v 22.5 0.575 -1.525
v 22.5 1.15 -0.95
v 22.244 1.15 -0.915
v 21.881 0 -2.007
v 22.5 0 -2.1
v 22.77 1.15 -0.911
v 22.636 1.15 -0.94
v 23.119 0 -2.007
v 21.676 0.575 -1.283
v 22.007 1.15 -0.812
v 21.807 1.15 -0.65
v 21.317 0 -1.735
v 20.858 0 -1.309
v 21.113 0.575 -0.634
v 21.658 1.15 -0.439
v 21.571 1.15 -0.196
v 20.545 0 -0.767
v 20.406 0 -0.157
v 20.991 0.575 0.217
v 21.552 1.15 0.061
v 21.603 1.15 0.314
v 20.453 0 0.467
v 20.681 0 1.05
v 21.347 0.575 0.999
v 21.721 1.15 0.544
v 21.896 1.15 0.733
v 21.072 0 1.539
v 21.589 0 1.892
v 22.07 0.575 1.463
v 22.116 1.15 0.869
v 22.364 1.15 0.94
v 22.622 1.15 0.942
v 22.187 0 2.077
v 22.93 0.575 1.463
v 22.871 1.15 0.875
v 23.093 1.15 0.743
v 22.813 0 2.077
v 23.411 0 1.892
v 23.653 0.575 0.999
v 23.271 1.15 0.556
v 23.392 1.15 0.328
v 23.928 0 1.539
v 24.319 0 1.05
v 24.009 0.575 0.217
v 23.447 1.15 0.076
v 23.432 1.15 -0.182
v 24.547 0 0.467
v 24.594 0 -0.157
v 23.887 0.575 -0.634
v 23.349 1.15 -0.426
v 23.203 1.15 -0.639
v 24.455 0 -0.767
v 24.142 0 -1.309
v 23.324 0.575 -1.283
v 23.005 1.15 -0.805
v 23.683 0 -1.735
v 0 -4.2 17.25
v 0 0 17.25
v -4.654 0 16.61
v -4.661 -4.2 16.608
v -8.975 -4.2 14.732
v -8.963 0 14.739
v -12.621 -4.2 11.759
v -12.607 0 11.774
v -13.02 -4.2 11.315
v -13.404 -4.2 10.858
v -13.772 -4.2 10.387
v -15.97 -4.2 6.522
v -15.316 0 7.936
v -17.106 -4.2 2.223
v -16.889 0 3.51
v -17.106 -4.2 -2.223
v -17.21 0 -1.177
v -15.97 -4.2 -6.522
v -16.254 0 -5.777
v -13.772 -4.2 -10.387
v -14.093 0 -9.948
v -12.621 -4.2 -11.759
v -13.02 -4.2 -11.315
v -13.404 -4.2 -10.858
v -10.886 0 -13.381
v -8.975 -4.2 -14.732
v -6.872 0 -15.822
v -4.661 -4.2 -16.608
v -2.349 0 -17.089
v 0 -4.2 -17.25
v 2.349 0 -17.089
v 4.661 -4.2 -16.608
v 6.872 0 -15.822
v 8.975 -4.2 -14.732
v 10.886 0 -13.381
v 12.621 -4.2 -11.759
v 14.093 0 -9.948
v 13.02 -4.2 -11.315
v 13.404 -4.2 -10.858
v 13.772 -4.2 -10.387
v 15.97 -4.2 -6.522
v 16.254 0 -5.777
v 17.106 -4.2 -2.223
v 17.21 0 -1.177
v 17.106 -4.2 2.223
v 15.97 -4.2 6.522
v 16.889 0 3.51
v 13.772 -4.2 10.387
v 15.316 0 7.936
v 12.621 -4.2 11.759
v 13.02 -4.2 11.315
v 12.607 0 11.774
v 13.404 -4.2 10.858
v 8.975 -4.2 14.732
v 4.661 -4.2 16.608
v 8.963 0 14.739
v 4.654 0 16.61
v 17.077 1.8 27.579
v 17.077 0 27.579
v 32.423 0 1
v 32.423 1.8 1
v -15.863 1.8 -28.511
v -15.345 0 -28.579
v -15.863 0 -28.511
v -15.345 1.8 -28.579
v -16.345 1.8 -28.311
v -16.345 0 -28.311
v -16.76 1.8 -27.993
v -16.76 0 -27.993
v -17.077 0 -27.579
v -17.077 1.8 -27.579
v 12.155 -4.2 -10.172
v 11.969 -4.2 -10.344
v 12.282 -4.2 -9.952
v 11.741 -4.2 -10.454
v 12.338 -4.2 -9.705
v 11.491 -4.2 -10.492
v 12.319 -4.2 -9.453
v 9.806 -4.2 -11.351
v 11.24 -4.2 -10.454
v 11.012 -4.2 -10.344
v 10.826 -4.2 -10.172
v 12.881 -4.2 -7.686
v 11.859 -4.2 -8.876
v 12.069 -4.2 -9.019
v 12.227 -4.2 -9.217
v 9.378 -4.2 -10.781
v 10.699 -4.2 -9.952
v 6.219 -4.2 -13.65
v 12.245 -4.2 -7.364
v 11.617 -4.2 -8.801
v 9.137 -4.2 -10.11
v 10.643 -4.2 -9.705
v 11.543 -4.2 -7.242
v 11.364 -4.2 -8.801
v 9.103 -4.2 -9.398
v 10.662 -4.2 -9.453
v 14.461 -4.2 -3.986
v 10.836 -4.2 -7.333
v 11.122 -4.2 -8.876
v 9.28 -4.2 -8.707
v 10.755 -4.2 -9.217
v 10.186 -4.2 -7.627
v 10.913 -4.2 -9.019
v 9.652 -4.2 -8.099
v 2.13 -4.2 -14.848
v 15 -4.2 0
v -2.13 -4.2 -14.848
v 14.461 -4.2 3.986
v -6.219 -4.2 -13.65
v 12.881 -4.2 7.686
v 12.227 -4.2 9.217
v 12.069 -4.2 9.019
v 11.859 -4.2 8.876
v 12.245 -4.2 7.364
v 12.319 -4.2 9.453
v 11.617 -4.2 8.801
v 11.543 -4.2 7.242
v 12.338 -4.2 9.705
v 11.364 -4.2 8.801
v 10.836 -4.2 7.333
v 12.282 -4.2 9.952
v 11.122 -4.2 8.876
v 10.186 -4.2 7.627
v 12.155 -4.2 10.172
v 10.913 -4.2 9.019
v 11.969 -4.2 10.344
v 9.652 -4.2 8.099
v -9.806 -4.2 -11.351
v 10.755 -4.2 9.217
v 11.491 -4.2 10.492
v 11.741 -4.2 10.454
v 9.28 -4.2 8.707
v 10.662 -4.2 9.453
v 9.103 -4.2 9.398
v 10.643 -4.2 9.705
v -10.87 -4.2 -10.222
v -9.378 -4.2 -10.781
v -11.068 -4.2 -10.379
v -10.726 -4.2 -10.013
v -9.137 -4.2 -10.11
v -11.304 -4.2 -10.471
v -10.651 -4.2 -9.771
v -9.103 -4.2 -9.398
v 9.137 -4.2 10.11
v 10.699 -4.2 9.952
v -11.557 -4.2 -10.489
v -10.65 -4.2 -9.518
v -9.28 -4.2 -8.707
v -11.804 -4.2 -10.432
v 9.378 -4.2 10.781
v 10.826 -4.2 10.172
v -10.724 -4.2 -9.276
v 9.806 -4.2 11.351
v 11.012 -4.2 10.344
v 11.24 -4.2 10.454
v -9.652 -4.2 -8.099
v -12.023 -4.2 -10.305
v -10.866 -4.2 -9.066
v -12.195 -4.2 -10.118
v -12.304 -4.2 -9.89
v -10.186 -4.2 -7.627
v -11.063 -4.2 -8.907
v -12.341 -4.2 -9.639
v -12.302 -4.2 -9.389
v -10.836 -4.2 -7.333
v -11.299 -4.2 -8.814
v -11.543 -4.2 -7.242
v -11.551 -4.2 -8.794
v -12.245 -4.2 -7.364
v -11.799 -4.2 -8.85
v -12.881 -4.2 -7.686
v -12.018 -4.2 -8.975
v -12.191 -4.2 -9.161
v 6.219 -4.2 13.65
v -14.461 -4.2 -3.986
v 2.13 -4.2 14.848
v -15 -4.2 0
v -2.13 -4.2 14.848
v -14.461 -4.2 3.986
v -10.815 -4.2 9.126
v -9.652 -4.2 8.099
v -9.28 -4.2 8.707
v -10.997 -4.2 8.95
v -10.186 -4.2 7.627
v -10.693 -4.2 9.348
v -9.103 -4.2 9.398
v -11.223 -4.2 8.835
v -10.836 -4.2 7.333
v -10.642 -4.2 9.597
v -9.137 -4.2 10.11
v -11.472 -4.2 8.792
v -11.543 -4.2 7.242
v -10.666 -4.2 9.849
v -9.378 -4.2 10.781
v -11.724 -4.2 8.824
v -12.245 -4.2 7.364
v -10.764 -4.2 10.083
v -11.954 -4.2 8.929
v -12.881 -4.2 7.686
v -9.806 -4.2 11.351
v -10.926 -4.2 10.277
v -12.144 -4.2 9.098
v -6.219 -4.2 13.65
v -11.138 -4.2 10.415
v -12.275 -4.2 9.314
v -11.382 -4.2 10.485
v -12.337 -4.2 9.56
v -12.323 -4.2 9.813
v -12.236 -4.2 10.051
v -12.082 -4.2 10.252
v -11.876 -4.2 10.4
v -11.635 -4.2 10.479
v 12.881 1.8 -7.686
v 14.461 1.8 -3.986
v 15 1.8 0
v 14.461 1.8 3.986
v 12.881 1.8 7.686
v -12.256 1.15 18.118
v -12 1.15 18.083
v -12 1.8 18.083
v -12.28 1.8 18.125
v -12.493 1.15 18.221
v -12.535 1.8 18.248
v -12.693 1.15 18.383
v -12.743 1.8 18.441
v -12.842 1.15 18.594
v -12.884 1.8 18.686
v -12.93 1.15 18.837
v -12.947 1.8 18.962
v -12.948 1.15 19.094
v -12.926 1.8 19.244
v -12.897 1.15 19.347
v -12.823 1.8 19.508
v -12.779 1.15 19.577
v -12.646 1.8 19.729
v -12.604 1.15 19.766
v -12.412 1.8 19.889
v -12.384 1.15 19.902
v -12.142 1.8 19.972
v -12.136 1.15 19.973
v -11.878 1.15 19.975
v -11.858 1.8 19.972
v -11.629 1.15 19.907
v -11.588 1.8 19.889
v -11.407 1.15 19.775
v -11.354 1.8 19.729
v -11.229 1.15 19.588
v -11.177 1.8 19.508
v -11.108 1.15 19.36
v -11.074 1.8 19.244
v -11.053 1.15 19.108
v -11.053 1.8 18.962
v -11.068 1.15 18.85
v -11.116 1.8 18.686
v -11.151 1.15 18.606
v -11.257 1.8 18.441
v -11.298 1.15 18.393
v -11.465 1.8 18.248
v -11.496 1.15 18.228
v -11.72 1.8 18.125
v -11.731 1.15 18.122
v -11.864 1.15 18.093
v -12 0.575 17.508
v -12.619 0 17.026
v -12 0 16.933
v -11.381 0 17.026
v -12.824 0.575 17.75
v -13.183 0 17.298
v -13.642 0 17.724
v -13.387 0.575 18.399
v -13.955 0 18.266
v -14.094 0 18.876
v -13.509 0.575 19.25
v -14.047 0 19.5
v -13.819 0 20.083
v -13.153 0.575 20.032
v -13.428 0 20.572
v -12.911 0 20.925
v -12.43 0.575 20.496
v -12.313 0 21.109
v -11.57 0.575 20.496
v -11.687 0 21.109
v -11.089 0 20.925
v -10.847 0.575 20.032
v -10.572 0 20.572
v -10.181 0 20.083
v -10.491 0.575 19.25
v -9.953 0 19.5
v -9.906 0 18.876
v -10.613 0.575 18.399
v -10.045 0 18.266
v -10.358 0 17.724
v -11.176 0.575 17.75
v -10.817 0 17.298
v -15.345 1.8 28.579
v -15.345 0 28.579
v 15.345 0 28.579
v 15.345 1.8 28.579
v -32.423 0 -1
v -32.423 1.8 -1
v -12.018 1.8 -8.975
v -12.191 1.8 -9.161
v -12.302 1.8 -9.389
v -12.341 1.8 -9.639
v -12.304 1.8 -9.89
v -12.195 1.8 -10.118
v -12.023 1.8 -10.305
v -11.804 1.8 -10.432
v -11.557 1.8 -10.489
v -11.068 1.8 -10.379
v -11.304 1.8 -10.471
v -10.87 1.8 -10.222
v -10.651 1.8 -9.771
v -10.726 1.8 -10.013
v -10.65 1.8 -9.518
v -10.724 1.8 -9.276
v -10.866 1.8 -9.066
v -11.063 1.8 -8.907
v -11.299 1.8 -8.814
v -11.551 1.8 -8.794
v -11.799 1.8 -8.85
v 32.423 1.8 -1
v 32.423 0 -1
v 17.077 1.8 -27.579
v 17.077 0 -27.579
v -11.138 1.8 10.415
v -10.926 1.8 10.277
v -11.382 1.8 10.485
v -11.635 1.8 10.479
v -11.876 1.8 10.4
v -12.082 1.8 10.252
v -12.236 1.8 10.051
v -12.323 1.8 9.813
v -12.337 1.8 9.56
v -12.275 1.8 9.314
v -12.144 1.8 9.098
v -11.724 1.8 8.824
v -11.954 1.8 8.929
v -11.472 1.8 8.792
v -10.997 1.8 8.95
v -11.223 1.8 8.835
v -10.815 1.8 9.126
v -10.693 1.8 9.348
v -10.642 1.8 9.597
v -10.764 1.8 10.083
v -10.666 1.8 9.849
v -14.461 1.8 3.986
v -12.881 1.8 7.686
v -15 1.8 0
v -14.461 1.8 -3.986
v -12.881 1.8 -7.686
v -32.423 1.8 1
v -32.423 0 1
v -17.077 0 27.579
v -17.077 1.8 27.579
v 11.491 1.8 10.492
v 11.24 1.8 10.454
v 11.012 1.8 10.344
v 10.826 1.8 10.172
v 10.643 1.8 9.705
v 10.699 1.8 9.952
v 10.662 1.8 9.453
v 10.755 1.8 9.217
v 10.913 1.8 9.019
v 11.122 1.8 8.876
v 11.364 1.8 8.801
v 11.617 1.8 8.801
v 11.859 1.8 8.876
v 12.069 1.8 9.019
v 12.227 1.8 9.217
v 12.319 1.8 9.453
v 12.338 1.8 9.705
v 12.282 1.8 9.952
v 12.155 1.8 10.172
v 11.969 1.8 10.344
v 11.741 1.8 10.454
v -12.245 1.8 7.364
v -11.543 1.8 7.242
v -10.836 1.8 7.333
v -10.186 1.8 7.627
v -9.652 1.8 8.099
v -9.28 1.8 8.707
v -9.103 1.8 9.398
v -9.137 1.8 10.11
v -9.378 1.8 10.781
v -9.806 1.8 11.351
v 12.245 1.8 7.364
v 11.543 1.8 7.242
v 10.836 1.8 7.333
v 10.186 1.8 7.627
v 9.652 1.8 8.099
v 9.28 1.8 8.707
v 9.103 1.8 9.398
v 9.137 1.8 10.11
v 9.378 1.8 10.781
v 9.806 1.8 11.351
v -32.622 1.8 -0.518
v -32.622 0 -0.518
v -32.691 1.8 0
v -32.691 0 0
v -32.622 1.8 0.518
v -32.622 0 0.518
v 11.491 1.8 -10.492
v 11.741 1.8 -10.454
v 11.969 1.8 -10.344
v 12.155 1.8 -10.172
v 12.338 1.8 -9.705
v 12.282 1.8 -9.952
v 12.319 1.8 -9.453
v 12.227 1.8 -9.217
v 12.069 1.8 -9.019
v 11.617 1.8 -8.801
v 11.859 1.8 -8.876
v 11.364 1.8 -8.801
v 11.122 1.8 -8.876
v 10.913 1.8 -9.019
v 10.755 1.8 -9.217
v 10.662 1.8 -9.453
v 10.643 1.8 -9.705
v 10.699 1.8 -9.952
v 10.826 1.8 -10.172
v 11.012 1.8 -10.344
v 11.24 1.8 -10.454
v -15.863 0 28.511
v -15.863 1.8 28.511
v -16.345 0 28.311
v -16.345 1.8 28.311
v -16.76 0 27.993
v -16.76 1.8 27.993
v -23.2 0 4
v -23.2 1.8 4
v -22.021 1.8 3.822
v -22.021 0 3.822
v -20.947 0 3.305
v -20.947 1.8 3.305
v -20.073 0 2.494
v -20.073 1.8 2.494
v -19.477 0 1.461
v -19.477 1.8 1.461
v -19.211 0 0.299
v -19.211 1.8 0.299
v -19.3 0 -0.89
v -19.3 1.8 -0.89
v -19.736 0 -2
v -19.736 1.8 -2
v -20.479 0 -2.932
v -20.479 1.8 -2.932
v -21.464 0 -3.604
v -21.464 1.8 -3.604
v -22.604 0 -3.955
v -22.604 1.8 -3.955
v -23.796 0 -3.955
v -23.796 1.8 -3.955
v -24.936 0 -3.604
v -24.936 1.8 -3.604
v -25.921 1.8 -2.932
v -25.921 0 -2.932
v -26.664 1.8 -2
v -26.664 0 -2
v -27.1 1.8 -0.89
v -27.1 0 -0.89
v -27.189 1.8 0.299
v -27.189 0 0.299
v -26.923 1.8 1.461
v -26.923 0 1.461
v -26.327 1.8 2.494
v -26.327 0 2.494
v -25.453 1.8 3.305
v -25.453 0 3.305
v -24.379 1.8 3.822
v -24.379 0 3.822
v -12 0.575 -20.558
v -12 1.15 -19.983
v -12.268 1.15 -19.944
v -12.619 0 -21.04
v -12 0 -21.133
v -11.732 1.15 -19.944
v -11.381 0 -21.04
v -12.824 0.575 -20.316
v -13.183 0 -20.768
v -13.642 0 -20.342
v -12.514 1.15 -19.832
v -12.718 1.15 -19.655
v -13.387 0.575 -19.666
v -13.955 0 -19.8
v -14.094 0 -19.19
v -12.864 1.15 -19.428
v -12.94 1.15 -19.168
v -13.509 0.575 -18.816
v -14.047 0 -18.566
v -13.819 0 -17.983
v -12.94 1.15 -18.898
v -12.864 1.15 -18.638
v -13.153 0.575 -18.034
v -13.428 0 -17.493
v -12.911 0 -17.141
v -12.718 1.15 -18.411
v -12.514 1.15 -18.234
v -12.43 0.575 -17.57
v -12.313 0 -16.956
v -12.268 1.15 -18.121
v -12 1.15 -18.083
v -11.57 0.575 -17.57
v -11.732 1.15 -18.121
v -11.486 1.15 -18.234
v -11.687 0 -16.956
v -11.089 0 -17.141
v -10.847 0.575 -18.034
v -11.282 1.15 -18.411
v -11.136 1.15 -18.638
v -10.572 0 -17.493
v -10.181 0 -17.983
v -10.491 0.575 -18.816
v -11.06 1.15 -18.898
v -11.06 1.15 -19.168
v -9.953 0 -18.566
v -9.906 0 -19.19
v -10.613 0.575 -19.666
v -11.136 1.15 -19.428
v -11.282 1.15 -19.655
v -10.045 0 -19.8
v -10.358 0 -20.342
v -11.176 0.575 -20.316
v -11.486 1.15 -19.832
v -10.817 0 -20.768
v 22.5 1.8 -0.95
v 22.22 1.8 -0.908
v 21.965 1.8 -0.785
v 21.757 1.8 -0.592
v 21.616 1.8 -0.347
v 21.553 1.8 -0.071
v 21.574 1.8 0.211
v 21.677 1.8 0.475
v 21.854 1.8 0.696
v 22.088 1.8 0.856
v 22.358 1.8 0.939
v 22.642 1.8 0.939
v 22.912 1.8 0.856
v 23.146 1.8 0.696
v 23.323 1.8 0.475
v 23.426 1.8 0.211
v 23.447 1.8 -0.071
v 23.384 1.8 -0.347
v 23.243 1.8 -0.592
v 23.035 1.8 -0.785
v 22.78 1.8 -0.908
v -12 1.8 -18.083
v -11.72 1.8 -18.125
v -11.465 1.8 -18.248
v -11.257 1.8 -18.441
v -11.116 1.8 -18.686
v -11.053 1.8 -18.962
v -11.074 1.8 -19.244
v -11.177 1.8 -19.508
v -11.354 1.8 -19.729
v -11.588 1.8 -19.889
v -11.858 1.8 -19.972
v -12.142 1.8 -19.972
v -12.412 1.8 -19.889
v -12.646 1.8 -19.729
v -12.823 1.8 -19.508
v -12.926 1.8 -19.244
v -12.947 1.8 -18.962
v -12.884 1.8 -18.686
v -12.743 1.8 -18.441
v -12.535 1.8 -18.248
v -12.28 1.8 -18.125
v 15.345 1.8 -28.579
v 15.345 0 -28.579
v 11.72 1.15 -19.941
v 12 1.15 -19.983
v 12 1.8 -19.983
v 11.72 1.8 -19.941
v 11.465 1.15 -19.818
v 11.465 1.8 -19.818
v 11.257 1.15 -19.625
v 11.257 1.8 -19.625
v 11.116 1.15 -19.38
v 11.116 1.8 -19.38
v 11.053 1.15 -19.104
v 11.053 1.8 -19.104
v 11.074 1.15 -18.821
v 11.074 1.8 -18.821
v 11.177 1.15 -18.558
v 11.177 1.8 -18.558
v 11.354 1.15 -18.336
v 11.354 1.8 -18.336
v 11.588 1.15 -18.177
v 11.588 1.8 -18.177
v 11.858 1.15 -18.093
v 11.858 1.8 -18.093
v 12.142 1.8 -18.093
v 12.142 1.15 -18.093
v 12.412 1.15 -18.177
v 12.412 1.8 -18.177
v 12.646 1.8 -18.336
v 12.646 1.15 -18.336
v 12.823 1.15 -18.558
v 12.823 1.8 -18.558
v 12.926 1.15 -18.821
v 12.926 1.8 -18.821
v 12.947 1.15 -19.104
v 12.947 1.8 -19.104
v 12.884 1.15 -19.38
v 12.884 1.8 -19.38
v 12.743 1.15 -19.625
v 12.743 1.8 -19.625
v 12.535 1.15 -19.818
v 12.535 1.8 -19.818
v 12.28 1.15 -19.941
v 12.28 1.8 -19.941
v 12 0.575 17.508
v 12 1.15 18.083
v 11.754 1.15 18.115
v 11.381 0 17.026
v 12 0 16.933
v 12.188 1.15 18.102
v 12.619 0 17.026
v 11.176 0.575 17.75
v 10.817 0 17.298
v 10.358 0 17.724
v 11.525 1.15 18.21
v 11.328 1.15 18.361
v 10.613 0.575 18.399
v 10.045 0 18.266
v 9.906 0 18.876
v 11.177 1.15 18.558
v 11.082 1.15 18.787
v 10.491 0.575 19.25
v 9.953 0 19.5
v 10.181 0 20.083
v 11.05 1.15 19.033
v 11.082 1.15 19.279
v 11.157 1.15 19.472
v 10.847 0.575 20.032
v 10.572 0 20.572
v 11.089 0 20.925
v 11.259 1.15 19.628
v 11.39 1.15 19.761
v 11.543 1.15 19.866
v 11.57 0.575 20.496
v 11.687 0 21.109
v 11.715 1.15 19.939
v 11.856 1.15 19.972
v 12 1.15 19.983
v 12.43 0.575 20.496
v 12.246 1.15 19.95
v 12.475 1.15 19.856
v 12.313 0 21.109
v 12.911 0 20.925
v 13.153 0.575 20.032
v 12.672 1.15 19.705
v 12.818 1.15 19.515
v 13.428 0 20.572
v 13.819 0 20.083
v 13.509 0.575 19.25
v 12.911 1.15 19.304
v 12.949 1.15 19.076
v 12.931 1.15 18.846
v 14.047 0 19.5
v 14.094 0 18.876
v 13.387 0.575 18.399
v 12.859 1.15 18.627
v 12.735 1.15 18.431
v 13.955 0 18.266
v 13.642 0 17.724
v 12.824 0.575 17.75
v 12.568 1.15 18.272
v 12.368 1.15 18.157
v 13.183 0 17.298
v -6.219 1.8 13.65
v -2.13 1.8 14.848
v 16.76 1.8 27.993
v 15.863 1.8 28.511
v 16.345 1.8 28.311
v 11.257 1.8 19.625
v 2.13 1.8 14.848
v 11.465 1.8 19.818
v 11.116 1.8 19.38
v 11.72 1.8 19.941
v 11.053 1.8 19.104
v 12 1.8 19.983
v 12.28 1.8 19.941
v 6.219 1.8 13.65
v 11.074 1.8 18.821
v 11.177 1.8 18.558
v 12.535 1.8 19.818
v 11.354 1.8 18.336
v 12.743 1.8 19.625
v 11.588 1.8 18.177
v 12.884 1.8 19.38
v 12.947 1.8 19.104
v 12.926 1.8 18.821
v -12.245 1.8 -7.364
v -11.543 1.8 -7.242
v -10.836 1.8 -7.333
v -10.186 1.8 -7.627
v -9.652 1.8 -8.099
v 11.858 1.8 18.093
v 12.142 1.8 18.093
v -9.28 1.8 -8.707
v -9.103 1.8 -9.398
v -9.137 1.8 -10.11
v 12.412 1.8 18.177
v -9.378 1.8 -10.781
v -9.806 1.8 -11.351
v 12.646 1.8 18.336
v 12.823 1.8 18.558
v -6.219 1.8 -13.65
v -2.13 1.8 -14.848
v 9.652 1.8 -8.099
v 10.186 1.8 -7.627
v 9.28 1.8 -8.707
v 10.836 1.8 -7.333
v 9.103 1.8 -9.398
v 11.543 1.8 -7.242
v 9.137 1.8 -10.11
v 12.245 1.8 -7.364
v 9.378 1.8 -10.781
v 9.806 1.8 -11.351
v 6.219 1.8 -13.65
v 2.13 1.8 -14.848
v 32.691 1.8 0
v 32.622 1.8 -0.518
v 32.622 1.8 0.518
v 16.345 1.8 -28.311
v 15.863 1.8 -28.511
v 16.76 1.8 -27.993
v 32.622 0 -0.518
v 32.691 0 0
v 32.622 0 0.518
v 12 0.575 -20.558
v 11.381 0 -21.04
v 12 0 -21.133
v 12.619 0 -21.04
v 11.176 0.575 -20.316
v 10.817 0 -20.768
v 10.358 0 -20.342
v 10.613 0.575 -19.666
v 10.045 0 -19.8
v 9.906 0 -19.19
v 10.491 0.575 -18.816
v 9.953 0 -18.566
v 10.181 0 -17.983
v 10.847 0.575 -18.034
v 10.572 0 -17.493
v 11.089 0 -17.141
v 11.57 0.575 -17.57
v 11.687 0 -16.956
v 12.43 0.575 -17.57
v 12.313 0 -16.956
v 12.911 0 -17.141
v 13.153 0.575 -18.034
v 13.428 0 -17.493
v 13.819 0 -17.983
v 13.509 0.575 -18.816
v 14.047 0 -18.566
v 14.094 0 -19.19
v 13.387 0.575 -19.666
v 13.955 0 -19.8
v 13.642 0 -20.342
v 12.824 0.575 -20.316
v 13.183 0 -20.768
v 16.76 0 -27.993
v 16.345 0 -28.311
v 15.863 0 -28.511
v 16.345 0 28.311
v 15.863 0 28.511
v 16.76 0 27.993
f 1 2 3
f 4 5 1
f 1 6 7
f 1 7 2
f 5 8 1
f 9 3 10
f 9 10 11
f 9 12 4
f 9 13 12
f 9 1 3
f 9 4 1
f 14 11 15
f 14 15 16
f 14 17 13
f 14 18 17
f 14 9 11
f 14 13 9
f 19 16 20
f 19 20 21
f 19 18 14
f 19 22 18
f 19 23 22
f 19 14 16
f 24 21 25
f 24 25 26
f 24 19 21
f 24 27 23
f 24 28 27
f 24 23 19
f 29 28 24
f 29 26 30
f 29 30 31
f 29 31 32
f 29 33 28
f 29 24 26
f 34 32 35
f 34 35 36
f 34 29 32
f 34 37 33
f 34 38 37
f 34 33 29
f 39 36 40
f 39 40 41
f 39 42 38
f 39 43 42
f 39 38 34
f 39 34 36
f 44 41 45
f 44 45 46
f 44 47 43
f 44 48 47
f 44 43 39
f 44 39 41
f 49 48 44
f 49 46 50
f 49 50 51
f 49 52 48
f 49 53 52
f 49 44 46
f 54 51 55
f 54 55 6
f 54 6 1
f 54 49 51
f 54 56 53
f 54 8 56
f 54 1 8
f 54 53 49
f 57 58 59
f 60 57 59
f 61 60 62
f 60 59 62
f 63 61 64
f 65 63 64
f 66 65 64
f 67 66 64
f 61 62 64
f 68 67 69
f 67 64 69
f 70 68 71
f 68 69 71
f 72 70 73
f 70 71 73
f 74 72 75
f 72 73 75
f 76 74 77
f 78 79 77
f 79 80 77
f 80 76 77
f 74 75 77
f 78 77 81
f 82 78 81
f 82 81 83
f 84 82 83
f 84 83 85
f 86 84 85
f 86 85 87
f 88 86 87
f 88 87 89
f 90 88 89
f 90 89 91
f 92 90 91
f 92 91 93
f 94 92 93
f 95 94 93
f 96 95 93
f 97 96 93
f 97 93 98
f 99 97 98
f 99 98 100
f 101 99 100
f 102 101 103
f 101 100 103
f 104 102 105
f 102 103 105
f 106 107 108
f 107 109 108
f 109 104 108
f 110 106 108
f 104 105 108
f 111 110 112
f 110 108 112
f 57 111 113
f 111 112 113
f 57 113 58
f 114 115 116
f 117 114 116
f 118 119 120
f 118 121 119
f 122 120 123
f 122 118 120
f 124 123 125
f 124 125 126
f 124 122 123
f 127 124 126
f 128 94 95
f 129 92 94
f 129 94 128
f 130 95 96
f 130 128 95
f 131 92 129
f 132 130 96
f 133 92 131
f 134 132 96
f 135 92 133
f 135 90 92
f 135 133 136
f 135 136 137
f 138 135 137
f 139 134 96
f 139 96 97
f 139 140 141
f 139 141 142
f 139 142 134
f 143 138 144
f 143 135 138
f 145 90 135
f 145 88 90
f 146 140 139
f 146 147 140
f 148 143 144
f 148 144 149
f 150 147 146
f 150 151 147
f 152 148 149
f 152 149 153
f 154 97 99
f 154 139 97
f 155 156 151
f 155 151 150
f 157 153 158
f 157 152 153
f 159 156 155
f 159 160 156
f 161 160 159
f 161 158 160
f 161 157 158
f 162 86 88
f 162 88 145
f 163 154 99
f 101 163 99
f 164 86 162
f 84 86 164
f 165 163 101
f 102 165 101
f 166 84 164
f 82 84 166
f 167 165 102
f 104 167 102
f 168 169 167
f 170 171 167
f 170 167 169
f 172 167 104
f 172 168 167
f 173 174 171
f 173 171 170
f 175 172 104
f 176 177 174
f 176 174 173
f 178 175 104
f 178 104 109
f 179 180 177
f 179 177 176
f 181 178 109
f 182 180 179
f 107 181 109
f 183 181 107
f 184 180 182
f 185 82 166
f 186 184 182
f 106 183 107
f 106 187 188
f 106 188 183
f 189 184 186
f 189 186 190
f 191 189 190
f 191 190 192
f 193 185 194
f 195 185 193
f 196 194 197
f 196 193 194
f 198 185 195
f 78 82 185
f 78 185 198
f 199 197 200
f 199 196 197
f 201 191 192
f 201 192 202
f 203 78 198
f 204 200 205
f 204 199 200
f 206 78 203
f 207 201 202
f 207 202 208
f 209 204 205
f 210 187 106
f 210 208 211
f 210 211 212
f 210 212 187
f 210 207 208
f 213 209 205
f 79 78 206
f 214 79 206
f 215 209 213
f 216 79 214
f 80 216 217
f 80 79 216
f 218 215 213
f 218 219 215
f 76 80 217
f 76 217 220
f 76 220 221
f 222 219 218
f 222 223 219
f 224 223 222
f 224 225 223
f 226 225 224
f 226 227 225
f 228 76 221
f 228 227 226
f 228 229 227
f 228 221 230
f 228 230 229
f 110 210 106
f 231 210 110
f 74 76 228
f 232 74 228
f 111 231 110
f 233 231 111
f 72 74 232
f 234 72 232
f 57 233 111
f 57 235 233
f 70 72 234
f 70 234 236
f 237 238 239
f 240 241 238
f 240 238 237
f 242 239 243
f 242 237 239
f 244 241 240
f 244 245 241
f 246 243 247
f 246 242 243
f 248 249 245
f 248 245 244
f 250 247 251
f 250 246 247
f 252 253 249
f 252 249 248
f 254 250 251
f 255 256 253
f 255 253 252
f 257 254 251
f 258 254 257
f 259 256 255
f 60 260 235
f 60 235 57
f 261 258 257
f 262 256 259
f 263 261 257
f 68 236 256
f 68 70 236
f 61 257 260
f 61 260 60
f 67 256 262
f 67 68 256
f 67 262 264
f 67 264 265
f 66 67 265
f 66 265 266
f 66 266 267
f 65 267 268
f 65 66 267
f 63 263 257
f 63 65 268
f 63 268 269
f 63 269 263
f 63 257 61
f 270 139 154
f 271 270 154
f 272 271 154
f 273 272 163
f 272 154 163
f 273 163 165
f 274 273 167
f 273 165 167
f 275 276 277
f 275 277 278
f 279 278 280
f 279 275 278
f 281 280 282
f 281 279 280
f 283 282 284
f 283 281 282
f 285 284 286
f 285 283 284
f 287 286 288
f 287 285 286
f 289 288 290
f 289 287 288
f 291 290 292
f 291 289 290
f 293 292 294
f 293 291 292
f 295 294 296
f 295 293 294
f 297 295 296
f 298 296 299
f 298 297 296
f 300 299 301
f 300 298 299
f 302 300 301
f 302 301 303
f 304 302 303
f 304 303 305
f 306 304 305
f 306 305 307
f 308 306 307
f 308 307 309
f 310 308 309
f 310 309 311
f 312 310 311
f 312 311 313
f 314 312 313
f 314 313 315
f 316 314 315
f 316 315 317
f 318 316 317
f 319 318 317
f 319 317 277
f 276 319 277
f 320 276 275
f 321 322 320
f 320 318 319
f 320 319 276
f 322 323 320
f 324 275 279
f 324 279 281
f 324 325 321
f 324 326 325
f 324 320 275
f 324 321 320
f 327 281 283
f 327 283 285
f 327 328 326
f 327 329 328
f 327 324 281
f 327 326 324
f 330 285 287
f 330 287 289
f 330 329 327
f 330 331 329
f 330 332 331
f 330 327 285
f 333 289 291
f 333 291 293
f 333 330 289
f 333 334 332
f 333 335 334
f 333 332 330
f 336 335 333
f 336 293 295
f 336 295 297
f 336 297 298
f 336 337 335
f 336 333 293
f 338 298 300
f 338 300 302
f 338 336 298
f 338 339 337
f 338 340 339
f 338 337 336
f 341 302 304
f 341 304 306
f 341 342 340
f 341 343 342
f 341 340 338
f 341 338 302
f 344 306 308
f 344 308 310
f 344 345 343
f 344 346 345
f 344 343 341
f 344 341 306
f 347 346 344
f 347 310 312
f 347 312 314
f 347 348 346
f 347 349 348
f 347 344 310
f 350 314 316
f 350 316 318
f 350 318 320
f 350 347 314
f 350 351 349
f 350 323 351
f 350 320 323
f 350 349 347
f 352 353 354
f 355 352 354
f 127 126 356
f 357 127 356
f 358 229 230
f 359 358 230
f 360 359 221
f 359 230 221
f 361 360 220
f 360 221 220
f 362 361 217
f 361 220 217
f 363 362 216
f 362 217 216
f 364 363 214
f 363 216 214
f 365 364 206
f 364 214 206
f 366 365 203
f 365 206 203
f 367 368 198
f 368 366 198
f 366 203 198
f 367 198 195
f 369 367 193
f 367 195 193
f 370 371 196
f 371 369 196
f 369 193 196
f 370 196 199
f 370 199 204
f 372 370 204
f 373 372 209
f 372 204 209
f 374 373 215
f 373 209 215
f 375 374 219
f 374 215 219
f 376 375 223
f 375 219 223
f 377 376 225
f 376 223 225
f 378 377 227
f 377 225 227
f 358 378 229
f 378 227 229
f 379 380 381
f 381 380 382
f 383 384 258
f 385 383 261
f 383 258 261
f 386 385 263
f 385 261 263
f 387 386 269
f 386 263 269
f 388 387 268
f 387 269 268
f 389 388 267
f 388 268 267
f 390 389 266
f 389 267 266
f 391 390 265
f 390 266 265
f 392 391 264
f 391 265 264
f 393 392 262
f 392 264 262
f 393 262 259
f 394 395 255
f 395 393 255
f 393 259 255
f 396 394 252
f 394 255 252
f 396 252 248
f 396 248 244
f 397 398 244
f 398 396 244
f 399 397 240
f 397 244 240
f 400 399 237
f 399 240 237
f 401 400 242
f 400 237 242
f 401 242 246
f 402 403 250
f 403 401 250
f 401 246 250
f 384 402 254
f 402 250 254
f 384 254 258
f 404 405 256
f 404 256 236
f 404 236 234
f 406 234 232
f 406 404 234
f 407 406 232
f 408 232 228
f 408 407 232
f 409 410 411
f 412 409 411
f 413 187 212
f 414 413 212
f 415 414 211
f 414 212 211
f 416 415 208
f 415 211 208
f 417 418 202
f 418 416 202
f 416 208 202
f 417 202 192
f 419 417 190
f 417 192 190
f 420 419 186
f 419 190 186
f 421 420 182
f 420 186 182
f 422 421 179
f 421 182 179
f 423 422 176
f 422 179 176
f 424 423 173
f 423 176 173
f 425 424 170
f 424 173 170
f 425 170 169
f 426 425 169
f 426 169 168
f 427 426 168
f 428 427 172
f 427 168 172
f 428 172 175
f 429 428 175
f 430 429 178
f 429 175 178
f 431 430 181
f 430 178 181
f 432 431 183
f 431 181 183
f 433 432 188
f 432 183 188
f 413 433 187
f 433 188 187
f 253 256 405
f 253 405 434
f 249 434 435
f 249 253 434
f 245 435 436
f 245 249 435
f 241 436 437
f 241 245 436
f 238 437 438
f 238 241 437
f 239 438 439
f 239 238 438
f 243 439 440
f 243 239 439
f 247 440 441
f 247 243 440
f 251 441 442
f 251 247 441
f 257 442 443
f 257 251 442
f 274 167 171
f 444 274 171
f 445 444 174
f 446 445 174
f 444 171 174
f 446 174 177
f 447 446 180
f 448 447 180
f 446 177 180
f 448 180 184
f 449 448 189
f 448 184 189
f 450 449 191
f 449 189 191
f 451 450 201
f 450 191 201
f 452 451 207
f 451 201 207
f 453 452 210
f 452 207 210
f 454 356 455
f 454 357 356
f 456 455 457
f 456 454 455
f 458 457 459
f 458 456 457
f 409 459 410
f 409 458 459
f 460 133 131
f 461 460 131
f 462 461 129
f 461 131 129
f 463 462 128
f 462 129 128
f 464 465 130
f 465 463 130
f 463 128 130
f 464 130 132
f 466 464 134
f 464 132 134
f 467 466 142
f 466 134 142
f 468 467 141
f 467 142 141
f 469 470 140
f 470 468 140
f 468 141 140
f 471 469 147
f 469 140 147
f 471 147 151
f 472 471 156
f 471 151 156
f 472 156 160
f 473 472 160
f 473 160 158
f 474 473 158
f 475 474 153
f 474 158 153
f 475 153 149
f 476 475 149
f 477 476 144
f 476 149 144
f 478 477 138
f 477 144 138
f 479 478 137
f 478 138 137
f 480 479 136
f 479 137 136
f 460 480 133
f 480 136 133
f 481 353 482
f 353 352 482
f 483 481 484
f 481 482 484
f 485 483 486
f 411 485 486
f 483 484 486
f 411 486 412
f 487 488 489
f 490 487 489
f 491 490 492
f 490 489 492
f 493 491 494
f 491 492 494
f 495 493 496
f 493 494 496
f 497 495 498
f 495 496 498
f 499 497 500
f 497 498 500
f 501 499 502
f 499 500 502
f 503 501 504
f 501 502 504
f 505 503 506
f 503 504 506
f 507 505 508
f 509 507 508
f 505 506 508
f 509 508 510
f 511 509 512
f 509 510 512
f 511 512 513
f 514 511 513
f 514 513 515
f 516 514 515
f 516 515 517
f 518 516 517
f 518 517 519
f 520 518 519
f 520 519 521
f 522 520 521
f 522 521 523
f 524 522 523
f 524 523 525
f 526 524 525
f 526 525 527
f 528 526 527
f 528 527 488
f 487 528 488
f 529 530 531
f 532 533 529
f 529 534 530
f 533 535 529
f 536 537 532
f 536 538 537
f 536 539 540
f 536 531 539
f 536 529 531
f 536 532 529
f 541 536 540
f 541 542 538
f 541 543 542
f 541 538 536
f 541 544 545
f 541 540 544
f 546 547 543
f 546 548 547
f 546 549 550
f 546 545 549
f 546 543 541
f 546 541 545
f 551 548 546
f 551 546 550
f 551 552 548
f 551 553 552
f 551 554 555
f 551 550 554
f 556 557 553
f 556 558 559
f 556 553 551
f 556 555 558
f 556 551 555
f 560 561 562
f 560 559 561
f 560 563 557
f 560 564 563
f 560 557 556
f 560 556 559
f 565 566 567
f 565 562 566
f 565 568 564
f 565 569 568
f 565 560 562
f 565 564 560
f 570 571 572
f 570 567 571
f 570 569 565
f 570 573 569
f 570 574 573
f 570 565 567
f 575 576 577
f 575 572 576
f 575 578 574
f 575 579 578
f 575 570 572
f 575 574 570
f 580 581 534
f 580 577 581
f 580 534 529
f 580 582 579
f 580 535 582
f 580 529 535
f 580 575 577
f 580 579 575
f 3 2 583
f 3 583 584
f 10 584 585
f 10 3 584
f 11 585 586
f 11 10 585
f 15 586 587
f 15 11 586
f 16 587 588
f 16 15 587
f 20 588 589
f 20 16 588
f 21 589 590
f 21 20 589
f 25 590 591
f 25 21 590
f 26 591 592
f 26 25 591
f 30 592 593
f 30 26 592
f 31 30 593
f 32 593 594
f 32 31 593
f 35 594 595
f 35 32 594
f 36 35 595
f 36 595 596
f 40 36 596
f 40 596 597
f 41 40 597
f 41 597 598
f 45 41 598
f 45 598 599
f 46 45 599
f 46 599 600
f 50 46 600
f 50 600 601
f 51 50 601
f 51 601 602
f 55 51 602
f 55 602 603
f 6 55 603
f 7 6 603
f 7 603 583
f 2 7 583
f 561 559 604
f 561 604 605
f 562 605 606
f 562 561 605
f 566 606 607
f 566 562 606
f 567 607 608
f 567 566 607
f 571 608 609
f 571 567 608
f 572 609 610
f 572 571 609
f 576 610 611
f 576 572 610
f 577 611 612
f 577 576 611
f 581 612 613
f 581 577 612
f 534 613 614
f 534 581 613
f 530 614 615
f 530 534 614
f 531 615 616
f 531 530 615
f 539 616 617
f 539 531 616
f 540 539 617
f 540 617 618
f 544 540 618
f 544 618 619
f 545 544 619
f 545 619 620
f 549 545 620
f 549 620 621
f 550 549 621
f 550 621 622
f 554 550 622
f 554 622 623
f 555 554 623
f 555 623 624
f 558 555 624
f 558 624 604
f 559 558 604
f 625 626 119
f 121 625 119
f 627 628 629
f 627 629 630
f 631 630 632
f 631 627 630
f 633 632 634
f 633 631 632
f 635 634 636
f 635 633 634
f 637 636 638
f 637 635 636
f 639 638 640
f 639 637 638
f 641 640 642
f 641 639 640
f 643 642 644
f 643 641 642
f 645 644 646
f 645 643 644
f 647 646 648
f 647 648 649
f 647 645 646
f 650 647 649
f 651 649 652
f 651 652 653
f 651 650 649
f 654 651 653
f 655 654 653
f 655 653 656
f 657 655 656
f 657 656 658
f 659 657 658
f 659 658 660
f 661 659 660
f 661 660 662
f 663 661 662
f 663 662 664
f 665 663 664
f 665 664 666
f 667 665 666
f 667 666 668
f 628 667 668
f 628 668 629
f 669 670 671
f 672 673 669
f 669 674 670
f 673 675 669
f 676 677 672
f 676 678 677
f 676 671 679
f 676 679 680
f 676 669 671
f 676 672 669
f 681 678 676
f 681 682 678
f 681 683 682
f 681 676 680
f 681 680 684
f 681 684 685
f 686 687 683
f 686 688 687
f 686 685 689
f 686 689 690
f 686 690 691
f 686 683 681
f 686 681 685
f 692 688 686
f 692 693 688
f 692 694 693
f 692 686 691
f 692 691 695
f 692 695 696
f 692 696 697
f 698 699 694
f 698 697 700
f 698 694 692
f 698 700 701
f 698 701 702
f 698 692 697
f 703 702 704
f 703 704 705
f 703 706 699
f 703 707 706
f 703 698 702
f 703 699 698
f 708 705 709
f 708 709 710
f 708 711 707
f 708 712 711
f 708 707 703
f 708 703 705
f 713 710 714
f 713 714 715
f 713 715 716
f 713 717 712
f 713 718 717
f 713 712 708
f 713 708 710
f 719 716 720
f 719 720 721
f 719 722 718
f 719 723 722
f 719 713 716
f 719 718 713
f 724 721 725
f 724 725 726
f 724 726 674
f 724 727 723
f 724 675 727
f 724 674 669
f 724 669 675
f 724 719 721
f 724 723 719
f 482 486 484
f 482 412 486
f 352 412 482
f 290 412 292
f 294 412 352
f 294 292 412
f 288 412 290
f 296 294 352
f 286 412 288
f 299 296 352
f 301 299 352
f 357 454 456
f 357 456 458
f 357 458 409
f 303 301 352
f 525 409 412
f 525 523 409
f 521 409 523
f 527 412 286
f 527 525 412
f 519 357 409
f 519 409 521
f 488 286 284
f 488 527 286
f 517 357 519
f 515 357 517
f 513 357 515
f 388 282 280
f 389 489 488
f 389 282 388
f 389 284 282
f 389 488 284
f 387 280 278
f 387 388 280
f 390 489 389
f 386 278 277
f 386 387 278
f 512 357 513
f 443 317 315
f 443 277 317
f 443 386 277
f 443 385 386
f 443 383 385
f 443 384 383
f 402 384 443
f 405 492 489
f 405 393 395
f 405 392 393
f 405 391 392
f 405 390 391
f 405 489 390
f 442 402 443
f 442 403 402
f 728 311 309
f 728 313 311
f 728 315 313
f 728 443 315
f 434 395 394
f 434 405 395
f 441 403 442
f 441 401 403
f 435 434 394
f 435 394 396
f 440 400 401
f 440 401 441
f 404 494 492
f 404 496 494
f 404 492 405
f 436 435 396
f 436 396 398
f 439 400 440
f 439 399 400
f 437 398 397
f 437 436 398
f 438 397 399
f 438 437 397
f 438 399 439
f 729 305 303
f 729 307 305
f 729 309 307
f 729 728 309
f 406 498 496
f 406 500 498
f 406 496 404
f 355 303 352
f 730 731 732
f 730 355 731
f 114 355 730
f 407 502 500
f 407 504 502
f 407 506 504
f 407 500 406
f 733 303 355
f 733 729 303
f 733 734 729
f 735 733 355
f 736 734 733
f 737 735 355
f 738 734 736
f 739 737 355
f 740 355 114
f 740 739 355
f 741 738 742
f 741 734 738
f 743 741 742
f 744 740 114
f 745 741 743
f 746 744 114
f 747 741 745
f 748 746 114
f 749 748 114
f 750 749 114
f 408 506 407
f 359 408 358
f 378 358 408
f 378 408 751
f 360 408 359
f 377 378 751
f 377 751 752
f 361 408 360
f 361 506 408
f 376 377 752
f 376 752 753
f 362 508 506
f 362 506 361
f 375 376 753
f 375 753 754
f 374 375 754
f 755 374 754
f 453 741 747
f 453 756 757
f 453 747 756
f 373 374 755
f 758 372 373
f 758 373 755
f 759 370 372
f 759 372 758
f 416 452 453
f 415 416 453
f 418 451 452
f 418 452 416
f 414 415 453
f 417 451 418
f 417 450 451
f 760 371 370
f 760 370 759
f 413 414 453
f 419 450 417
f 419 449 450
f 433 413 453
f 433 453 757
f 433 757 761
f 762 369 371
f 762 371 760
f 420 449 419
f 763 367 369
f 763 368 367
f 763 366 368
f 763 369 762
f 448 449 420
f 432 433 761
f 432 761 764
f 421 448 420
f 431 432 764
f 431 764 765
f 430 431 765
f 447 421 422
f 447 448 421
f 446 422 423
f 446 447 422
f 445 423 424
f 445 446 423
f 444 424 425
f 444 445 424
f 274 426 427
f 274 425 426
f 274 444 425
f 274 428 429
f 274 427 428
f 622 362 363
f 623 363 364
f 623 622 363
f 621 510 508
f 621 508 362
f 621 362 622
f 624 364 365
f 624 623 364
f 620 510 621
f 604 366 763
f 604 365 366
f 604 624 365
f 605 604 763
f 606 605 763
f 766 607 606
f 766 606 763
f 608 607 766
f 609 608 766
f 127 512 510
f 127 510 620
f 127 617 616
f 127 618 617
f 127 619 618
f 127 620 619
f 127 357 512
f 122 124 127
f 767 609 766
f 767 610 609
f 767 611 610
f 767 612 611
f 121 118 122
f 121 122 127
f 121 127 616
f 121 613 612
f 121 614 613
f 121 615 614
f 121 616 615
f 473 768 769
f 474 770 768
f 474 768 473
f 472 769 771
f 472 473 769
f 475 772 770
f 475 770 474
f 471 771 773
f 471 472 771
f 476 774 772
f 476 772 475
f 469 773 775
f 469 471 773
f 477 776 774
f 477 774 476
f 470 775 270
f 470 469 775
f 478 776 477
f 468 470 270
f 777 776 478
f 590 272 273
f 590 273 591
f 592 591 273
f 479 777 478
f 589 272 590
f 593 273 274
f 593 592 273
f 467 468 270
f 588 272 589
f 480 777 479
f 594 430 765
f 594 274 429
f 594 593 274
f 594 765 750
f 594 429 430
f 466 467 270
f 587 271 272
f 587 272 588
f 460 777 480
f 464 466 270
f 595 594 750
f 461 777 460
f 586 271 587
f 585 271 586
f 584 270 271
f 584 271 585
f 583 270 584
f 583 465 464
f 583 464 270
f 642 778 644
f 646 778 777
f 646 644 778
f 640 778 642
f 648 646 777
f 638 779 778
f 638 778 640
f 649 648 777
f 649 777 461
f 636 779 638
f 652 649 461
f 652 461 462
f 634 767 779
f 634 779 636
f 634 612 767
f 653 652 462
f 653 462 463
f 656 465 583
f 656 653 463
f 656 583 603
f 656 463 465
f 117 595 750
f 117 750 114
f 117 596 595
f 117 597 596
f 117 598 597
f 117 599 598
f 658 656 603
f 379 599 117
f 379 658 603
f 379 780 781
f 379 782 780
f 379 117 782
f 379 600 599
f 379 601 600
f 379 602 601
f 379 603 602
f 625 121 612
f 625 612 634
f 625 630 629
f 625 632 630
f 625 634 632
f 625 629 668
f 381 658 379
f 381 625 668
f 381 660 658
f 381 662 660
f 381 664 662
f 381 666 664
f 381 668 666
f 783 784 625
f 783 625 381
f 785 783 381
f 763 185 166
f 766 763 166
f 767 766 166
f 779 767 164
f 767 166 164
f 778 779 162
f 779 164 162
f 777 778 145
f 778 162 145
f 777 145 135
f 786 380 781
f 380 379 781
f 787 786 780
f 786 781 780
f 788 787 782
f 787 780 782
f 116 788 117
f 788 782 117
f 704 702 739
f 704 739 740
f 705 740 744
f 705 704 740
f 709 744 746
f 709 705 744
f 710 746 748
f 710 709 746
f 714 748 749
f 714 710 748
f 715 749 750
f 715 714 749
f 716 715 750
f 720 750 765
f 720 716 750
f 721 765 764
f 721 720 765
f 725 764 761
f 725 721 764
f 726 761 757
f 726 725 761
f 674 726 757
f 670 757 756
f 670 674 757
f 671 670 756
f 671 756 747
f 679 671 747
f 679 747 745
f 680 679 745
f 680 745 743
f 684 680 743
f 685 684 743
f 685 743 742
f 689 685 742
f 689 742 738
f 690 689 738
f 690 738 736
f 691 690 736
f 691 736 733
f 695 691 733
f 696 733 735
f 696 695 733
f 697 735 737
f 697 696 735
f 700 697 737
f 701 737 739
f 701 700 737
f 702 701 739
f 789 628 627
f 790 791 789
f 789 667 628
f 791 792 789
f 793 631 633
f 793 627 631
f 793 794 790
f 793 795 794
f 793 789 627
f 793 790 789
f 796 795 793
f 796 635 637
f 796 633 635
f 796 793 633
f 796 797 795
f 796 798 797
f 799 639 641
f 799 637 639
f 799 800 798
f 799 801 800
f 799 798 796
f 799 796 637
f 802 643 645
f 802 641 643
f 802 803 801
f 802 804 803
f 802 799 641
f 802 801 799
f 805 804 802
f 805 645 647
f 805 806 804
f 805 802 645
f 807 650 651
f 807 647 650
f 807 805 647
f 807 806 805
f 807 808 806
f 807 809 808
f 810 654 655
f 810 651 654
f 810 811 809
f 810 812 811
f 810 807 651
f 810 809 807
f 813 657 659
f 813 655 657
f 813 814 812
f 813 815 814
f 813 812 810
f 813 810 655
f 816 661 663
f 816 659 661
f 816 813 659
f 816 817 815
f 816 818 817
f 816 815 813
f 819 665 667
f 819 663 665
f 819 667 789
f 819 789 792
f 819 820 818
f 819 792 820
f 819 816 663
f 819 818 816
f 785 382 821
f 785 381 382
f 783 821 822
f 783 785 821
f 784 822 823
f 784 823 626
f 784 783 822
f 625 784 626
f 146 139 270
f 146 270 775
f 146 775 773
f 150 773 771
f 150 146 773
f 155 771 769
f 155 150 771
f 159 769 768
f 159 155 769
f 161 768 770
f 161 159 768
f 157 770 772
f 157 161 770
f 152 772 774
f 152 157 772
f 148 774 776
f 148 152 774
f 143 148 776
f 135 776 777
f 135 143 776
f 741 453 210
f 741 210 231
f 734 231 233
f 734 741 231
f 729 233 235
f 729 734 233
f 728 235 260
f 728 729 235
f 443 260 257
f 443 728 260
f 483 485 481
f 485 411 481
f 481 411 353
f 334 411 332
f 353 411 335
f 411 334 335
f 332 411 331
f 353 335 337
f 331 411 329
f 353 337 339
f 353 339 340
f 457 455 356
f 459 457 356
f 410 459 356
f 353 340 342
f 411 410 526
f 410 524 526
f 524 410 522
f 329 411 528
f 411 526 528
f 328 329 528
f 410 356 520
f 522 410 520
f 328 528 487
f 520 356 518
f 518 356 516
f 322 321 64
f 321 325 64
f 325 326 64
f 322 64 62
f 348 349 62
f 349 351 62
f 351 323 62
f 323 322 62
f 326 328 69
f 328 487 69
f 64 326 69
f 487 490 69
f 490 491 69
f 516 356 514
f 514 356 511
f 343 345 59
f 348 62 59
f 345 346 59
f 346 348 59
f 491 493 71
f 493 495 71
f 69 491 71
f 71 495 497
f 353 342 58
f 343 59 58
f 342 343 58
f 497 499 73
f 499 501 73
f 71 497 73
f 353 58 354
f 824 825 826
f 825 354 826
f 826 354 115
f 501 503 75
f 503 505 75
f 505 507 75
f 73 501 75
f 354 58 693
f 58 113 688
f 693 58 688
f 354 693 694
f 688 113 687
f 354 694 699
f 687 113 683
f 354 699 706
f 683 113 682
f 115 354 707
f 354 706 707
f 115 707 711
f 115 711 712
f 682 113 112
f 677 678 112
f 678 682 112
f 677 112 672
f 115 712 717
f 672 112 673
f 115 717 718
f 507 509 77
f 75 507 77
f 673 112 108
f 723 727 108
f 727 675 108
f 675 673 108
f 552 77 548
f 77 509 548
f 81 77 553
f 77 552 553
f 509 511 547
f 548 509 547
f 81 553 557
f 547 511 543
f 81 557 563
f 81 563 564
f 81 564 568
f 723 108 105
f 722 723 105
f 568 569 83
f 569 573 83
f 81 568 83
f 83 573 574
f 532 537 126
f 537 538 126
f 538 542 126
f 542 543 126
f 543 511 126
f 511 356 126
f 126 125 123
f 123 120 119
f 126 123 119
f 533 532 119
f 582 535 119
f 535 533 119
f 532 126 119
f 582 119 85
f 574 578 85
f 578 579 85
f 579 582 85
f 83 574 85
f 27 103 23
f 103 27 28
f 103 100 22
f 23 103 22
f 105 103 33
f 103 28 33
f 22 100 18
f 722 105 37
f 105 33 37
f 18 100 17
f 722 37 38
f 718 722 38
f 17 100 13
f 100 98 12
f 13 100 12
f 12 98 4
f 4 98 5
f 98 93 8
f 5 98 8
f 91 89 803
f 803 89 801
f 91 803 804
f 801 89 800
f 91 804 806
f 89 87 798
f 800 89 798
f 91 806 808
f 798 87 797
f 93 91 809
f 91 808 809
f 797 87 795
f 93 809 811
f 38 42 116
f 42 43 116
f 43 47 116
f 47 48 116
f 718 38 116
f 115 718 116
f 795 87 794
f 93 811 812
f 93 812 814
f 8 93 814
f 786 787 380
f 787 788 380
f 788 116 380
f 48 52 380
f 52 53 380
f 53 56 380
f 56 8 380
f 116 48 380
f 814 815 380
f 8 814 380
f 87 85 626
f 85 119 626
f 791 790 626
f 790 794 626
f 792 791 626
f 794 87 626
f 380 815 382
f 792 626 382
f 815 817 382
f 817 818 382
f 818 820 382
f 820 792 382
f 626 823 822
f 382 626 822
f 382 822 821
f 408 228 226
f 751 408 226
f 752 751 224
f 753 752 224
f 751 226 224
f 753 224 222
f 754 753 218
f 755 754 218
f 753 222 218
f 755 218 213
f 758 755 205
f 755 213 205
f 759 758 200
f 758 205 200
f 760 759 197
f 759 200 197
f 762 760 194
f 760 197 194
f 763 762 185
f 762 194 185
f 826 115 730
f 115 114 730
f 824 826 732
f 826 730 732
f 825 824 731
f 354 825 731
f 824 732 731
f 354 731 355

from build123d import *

# Parameters (mm, degrees)
SKETCH_1_R                  = 0.95
EXTRUDE_1_DEPTH             = 1.8
FILLET_1_R                  = 2
HOLE_WIZARD_M2_1_AT_2_COUNT = 2
HOLE_WIZARD_M2_1_AT_2_PITCH = 24
HOLE_WIZARD_M2_1_AT_3_COUNT = 2
HOLE_WIZARD_M2_1_AT_3_PITCH = 39.40177661
HOLE_WIZARD_M2_1_AT_4_COUNT = 2
HOLE_WIZARD_M2_1_AT_4_PITCH = 45
HOLE_WIZARD_M2_1_AT_5_COUNT = 2
HOLE_WIZARD_M2_1_AT_5_PITCH = 38.065732621
HOLE_WIZARD_M2_1_AT_6_COUNT = 2
HOLE_WIZARD_M2_1_AT_6_PITCH = 21.737065119
SKETCH_4_R                  = 17.25
SKETCH_4_R_2                = 15
EXTRUDE_2_DEPTH             = 4.2
SKETCH_4_2_R                = 15
CUT_EXTRUDE_2_DEPTH         = 3.5
SKETCH_7_R                  = 0.85
EXTRUDE_3_DEPTH             = 6
SKETCH_7_2_R                = 0.85
CUT_EXTRUDE_4_DEPTH         = 7
SKETCH_8_R                  = 4
CUT_EXTRUDE_5_DEPTH         = 10


with BuildPart() as part:
    # Sketch 1 → Extrude 1 (new body)
    with BuildSketch(Plane(origin=(0, 0, 0), x_dir=(1, 0, 0), z_dir=(0, 1, 0))):
        Polygon((33, 0), (16.5, 28.578838325), (-16.5, 28.578838325), (-33, 0), (-16.5, -28.578838325), (16.5, -28.578838325), align=None)
        with Locations(Location((-12, 19.032866311, 0), (0, 0, 270))):  # turned: the seam where the file's is
            Circle(SKETCH_1_R, mode=Mode.SUBTRACT)
        with Locations(Location((-12, -19.032866311, 0), (0, 0, 90))):  # turned: the seam where the file's is
            Circle(SKETCH_1_R, mode=Mode.SUBTRACT)
        with Locations(Location((-22.5, 0, 0), (0, 0, 270))):  # turned: the seam where the file's is
            Circle(SKETCH_1_R, mode=Mode.SUBTRACT)
        with Locations(Location((22.5, 0, 0), (0, 0, 90))):  # turned: the seam where the file's is
            Circle(SKETCH_1_R, mode=Mode.SUBTRACT)
        with Locations(Location((12, -19.032866311, 0), (0, 0, 270))):  # turned: the seam where the file's is
            Circle(SKETCH_1_R, mode=Mode.SUBTRACT)
        with Locations(Location((12, 19.032866311, 0), (0, 0, 90))):  # turned: the seam where the file's is
            Circle(SKETCH_1_R, mode=Mode.SUBTRACT)
    extrude(amount=EXTRUDE_1_DEPTH)

    # Fillet 1
    fillet_1_edges = [part.edges().sort_by_distance(p)[0] for p in [
        (16.5, 0.9, 28.578838325),
        (-16.5, 0.9, 28.578838325),
        (-33, 0.9, 0),
        (-16.5, 0.9, -28.578838325),
        (16.5, 0.9, -28.578838325),
        (33, 0.9, 0),
    ]]
    fillet(fillet_1_edges, radius=FILLET_1_R)

    # Sketch 3 → Hole Wizard M2 _1 (revolve, cut)
    with BuildSketch(Plane(origin=(12, 0, -19.032866311), x_dir=(0, 0, -1), z_dir=(1, 0, 0))):
        Polygon((0, 0), (0, 1.8), (0.9, 1.8), (0.9, 1.2), (2.1, 0), align=None)
    hole_wizard_m2_1 = revolve(axis=Axis((12, -6.35, -19.032866311), (0, 1, 0)), mode=Mode.SUBTRACT)

    # Hole Wizard M2 _1 at 2: Hole Wizard M2 _1 ×2
    with Locations(*[(-i * HOLE_WIZARD_M2_1_AT_2_PITCH, 0, 0) for i in range(1, HOLE_WIZARD_M2_1_AT_2_COUNT)]):
        add(hole_wizard_m2_1, mode=Mode.SUBTRACT)

    # Hole Wizard M2 _1 at 3: Hole Wizard M2 _1 ×2
    with Locations(*[Vector(-0.875595036, 0, 0.483045892) * (i * HOLE_WIZARD_M2_1_AT_3_PITCH) for i in range(1, HOLE_WIZARD_M2_1_AT_3_COUNT)]):
        add(hole_wizard_m2_1, mode=Mode.SUBTRACT)

    # Hole Wizard M2 _1 at 4: Hole Wizard M2 _1 ×2
    with Locations(*[Vector(-0.533333333, 0, 0.845905169) * (i * HOLE_WIZARD_M2_1_AT_4_PITCH) for i in range(1, HOLE_WIZARD_M2_1_AT_4_COUNT)]):
        add(hole_wizard_m2_1, mode=Mode.SUBTRACT)

    # Hole Wizard M2 _1 at 5: Hole Wizard M2 _1 ×2
    with Locations(*[(0, 0, i * HOLE_WIZARD_M2_1_AT_5_PITCH) for i in range(1, HOLE_WIZARD_M2_1_AT_5_COUNT)]):
        add(hole_wizard_m2_1, mode=Mode.SUBTRACT)

    # Hole Wizard M2 _1 at 6: Hole Wizard M2 _1 ×2
    with Locations(*[Vector(0.483045892, 0, 0.875595036) * (i * HOLE_WIZARD_M2_1_AT_6_PITCH) for i in range(1, HOLE_WIZARD_M2_1_AT_6_COUNT)]):
        add(hole_wizard_m2_1, mode=Mode.SUBTRACT)

    # Sketch 4 → Extrude 2 (add)
    with BuildSketch(Plane.XZ):
        with Locations(Location((0, 0, 0), (0, 0, 90))):  # turned: the seam where the file's is
            Circle(SKETCH_4_R)
        with Locations(Location((0, 0, 0), (0, 0, 270))):  # turned: the seam where the file's is
            Circle(SKETCH_4_R_2, mode=Mode.SUBTRACT)
    extrude(amount=EXTRUDE_2_DEPTH)

    # Sketch 4_2 → Cut-Extrude 2 (cut)
    with BuildSketch(Plane.XZ):
        with Locations(Location((0, 0, 0), (0, 0, 90))):  # turned: the seam where the file's is
            Circle(SKETCH_4_2_R)
    extrude(amount=-CUT_EXTRUDE_2_DEPTH, mode=Mode.SUBTRACT)

    # Sketch 7 → Extrude 3 (add)
    with BuildSketch(Plane.XZ.offset(4.2)):
        with BuildLine():
            ThreePointArc((-13.77195188, 10.387292305), (-9.652159983, 8.099123882), (-12.620960341, 11.758990606))
            ThreePointArc((-12.620960341, 11.758990606), (-13.214266644, 11.088086267), (-13.77195188, 10.387292305))
        make_face()
        with Locations((-11.490666647, 9.641814145)):
            Circle(SKETCH_7_R, mode=Mode.SUBTRACT)
        with BuildLine():
            ThreePointArc((13.77195188, 10.387292305), (9.652159983, 8.099123882), (12.620960341, 11.758990606))
            ThreePointArc((12.620960341, 11.758990606), (13.214266644, 11.088086267), (13.77195188, 10.387292305))
        make_face()
        with Locations((11.490666647, 9.641814145)):
            Circle(SKETCH_7_R, mode=Mode.SUBTRACT)
        with BuildLine():
            ThreePointArc((13.77195188, -10.387292305), (9.652159983, -8.099123882), (12.620960341, -11.758990606))
            ThreePointArc((12.620960341, -11.758990606), (13.214266644, -11.088086267), (13.77195188, -10.387292305))
        make_face()
        with Locations((11.490666647, -9.641814145)):
            Circle(SKETCH_7_R, mode=Mode.SUBTRACT)
        with BuildLine():
            ThreePointArc((-13.77195188, -10.387292305), (-9.652159983, -8.099123882), (-12.620960341, -11.758990606))
            ThreePointArc((-12.620960341, -11.758990606), (-13.214266644, -11.088086267), (-13.77195188, -10.387292305))
        make_face()
        with Locations((-11.490666647, -9.641814145)):
            Circle(SKETCH_7_R, mode=Mode.SUBTRACT)
    extrude(amount=-EXTRUDE_3_DEPTH)

    # Sketch 7_2 → Cut-Extrude 4 (cut, through all)
    with BuildSketch(Plane.XZ.offset(4.2)):
        with Locations(Location((-11.490666647, 9.641814145, 0), (0, 0, 270))):  # turned: the seam where the file's is
            Circle(SKETCH_7_2_R)
        with Locations(Location((11.490666647, 9.641814145, 0), (0, 0, 90))):  # turned: the seam where the file's is
            Circle(SKETCH_7_2_R)
        with Locations(Location((11.490666647, -9.641814145, 0), (0, 0, 270))):  # turned: the seam where the file's is
            Circle(SKETCH_7_2_R)
        with Locations(Location((-11.490666647, -9.641814145, 0), (0, 0, 90))):  # turned: the seam where the file's is
            Circle(SKETCH_7_2_R)
    extrude(amount=-CUT_EXTRUDE_4_DEPTH, mode=Mode.SUBTRACT)

    # Sketch 8 → Cut-Extrude 5 (cut)
    with BuildSketch(Plane(origin=(0, 1.8, 0), x_dir=(1, 0, 0), z_dir=(0, 1, 0))):
        with Locations(Location((-23.2, 0, 0), (0, 0, 270))):  # turned: the seam where the file's is
            Circle(SKETCH_8_R)
    extrude(amount=-CUT_EXTRUDE_5_DEPTH, mode=Mode.SUBTRACT)


solid = part.part
